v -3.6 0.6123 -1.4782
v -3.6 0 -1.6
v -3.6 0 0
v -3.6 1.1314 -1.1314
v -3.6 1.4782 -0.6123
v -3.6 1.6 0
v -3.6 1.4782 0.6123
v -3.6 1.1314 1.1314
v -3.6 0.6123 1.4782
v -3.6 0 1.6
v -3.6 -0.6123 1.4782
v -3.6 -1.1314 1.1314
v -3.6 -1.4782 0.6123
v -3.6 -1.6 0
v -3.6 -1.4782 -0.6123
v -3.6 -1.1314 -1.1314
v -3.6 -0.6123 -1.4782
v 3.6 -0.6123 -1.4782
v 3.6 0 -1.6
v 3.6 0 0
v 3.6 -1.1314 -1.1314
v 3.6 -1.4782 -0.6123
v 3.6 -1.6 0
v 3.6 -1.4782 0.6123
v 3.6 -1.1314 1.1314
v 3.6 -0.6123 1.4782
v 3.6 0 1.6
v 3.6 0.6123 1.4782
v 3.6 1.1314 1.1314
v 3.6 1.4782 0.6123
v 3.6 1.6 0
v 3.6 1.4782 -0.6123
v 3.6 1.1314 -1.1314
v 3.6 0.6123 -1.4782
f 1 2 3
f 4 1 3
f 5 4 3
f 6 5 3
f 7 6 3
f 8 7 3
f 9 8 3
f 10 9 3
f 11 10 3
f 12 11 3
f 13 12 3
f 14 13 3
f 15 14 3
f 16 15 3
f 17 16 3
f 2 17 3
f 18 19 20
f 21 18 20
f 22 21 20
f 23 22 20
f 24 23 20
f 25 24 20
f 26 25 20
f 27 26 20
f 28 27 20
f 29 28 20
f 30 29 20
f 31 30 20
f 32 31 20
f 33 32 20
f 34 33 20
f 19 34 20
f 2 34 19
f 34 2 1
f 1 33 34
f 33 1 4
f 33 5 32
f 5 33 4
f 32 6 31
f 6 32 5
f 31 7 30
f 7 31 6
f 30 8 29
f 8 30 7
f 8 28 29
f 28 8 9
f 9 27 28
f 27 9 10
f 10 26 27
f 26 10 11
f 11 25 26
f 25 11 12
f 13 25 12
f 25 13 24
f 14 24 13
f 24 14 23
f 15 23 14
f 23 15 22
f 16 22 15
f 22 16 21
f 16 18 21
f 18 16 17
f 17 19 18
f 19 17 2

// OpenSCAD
// file: ../p/4-4cyli.scad
use <../lib.scad>
function ldraw_lib__4_4cyli() = [
// 0 Cylinder 1.0
// 0 Name: 4-4cyli.dat
// 0 Author: James Jessiman
// 0 !LDRAW_ORG Primitive UPDATE 2005-01
// 0 !LICENSE Licensed under CC BY 4.0 : see CAreadme.txt
// 
// 0 BFC CERTIFY CCW
  [0,"BFC","CERTIFY"],
  [0,"BFC","CCW"],
// 
// 0 !HISTORY 1998-12-15 [PTadmin] Official Update 1998-10
// 0 !HISTORY 2002-03-23 [sbliss] Added BFC statement; merged headers from files in distributions LDraw 0.27 and Complete.
// 0 !HISTORY 2002-04-25 [PTadmin] Official Update 2002-02
// 0 !HISTORY 2004-12-14 [guyvivan] BFC CCW
// 0 !HISTORY 2005-12-28 [PTadmin] Official Update 2005-01
// 0 !HISTORY 2007-06-24 [PTadmin] Header formatted for Contributor Agreement
// 0 !HISTORY 2008-07-01 [PTadmin] Official Update 2008-01
// 
// 
// 4 16 1 1 0 0.9239 1 0.3827 0.9239 0 0.3827 1 0 0
  [4,16,1,1,0,0.9239,1,0.3827,0.9239,0,0.3827,1,0,0],
// 5 24 1 0 0 1 1 0 0.9239 0 0.3827 0.9239 0 -0.3827
  [5,24,1,0,0,1,1,0,0.9239,0,0.3827,0.9239,0,-0.3827],
// 4 16 0.9239 1 0.3827 0.7071 1 0.7071 0.7071 0 0.7071 0.9239 0 0.3827
  [4,16,0.9239,1,0.3827,0.7071,1,0.7071,0.7071,0,0.7071,0.9239,0,0.3827],
// 5 24 0.9239 0 0.3827 0.9239 1 0.3827 0.7071 0 0.7071 1 0 0
  [5,24,0.9239,0,0.3827,0.9239,1,0.3827,0.7071,0,0.7071,1,0,0],
// 4 16 0.7071 1 0.7071 0.3827 1 0.9239 0.3827 0 0.9239 0.7071 0 0.7071
  [4,16,0.7071,1,0.7071,0.3827,1,0.9239,0.3827,0,0.9239,0.7071,0,0.7071],
// 5 24 0.7071 0 0.7071 0.7071 1 0.7071 0.3827 0 0.9239 0.9239 0 0.3827
  [5,24,0.7071,0,0.7071,0.7071,1,0.7071,0.3827,0,0.9239,0.9239,0,0.3827],
// 4 16 0.3827 1 0.9239 0 1 1 0 0 1 0.3827 0 0.9239
  [4,16,0.3827,1,0.9239,0,1,1,0,0,1,0.3827,0,0.9239],
// 5 24 0.3827 0 0.9239 0.3827 1 0.9239 0 0 1 0.7071 0 0.7071
  [5,24,0.3827,0,0.9239,0.3827,1,0.9239,0,0,1,0.7071,0,0.7071],
// 4 16 0 1 1 -0.3827 1 0.9239 -0.3827 0 0.9239 0 0 1
  [4,16,0,1,1,-0.3827,1,0.9239,-0.3827,0,0.9239,0,0,1],
// 5 24 0 0 1 0 1 1 -0.3827 0 0.9239 0.3827 0 0.9239
  [5,24,0,0,1,0,1,1,-0.3827,0,0.9239,0.3827,0,0.9239],
// 4 16 -0.3827 1 0.9239 -0.7071 1 0.7071 -0.7071 0 0.7071 -0.3827 0 0.9239
  [4,16,-0.3827,1,0.9239,-0.7071,1,0.7071,-0.7071,0,0.7071,-0.3827,0,0.9239],
// 5 24 -0.3827 0 0.9239 -0.3827 1 0.9239 -0.7071 0 0.7071 0 0 1
  [5,24,-0.3827,0,0.9239,-0.3827,1,0.9239,-0.7071,0,0.7071,0,0,1],
// 4 16 -0.7071 1 0.7071 -0.9239 1 0.3827 -0.9239 0 0.3827 -0.7071 0 0.7071
  [4,16,-0.7071,1,0.7071,-0.9239,1,0.3827,-0.9239,0,0.3827,-0.7071,0,0.7071],
// 5 24 -0.7071 0 0.7071 -0.7071 1 0.7071 -0.9239 0 0.3827 -0.3827 0 0.9239
  [5,24,-0.7071,0,0.7071,-0.7071,1,0.7071,-0.9239,0,0.3827,-0.3827,0,0.9239],
// 4 16 -0.9239 1 0.3827 -1 1 0 -1 0 0 -0.9239 0 0.3827
  [4,16,-0.9239,1,0.3827,-1,1,0,-1,0,0,-0.9239,0,0.3827],
// 5 24 -0.9239 0 0.3827 -0.9239 1 0.3827 -1 0 0 -0.7071 0 0.7071
  [5,24,-0.9239,0,0.3827,-0.9239,1,0.3827,-1,0,0,-0.7071,0,0.7071],
// 4 16 -1 1 0 -0.9239 1 -0.3827 -0.9239 0 -0.3827 -1 0 0
  [4,16,-1,1,0,-0.9239,1,-0.3827,-0.9239,0,-0.3827,-1,0,0],
// 5 24 -1 0 0 -1 1 0 -0.9239 0 -0.3827 -0.9239 0 0.3827
  [5,24,-1,0,0,-1,1,0,-0.9239,0,-0.3827,-0.9239,0,0.3827],
// 4 16 -0.9239 1 -0.3827 -0.7071 1 -0.7071 -0.7071 0 -0.7071 -0.9239 0 -0.3827
  [4,16,-0.9239,1,-0.3827,-0.7071,1,-0.7071,-0.7071,0,-0.7071,-0.9239,0,-0.3827],
// 5 24 -0.9239 0 -0.3827 -0.9239 1 -0.3827 -0.7071 0 -0.7071 -1 0 0
  [5,24,-0.9239,0,-0.3827,-0.9239,1,-0.3827,-0.7071,0,-0.7071,-1,0,0],
// 4 16 -0.7071 1 -0.7071 -0.3827 1 -0.9239 -0.3827 0 -0.9239 -0.7071 0 -0.7071
  [4,16,-0.7071,1,-0.7071,-0.3827,1,-0.9239,-0.3827,0,-0.9239,-0.7071,0,-0.7071],
// 5 24 -0.7071 0 -0.7071 -0.7071 1 -0.7071 -0.3827 0 -0.9239 -0.9239 0 -0.3827
  [5,24,-0.7071,0,-0.7071,-0.7071,1,-0.7071,-0.3827,0,-0.9239,-0.9239,0,-0.3827],
// 4 16 -0.3827 1 -0.9239 0 1 -1 0 0 -1 -0.3827 0 -0.9239
  [4,16,-0.3827,1,-0.9239,0,1,-1,0,0,-1,-0.3827,0,-0.9239],
// 5 24 -0.3827 0 -0.9239 -0.3827 1 -0.9239 0 0 -1 -0.7071 0 -0.7071
  [5,24,-0.3827,0,-0.9239,-0.3827,1,-0.9239,0,0,-1,-0.7071,0,-0.7071],
// 4 16 0 1 -1 0.3827 1 -0.9239 0.3827 0 -0.9239 0 0 -1
  [4,16,0,1,-1,0.3827,1,-0.9239,0.3827,0,-0.9239,0,0,-1],
// 5 24 0 0 -1 0 1 -1 0.3827 0 -0.9239 -0.3827 0 -0.9239
  [5,24,0,0,-1,0,1,-1,0.3827,0,-0.9239,-0.3827,0,-0.9239],
// 4 16 0.3827 1 -0.9239 0.7071 1 -0.7071 0.7071 0 -0.7071 0.3827 0 -0.9239
  [4,16,0.3827,1,-0.9239,0.7071,1,-0.7071,0.7071,0,-0.7071,0.3827,0,-0.9239],
// 5 24 0.3827 0 -0.9239 0.3827 1 -0.9239 0.7071 0 -0.7071 0 0 -1
  [5,24,0.3827,0,-0.9239,0.3827,1,-0.9239,0.7071,0,-0.7071,0,0,-1],
// 4 16 0.7071 1 -0.7071 0.9239 1 -0.3827 0.9239 0 -0.3827 0.7071 0 -0.7071
  [4,16,0.7071,1,-0.7071,0.9239,1,-0.3827,0.9239,0,-0.3827,0.7071,0,-0.7071],
// 5 24 0.7071 0 -0.7071 0.7071 1 -0.7071 0.9239 0 -0.3827 0.3827 0 -0.9239
  [5,24,0.7071,0,-0.7071,0.7071,1,-0.7071,0.9239,0,-0.3827,0.3827,0,-0.9239],
// 4 16 0.9239 1 -0.3827 1 1 0 1 0 0 0.9239 0 -0.3827
  [4,16,0.9239,1,-0.3827,1,1,0,1,0,0,0.9239,0,-0.3827],
// 5 24 0.9239 0 -0.3827 0.9239 1 -0.3827 1 0 0 0.7071 0 -0.7071
  [5,24,0.9239,0,-0.3827,0.9239,1,-0.3827,1,0,0,0.7071,0,-0.7071],
// 0
];
module ldraw_lib__4_4cyli(step=0, col=false, unit=2/5, alt=false, line=0.2, solid=!$preview)
    makepoly(ldraw_lib__4_4cyli(), step=step, col=col, unit=unit, alt=alt, line=line, solid=solid);
ldraw_lib__4_4cyli(line=0.2);
// file: ../p/4-4edge.scad
use <../lib.scad>
function ldraw_lib__4_4edge() = [
// 0 Circle 1.0
// 0 Name: 4-4edge.dat
// 0 Author: James Jessiman
// 0 !LDRAW_ORG Primitive UPDATE 2017-01
// 0 !LICENSE Licensed under CC BY 4.0 : see CAreadme.txt
// 
// 0 BFC CERTIFY CCW
  [0,"BFC","CERTIFY"],
  [0,"BFC","CCW"],
// 
// 0 !HISTORY 1998-12-15 [PTadmin] Official Update 1998-10
// 0 !HISTORY 2005-12-28 [PTadmin] Official Update 2005-01
// 0 !HISTORY 2007-06-24 [PTadmin] Header formatted for Contributor Agreement
// 0 !HISTORY 2008-07-01 [PTadmin] Official Update 2008-01
// 0 !HISTORY 2017-01-15 [Steffen] BFCed
// 0 !HISTORY 2017-12-30 [PTadmin] Official Update 2017-01
// 
// 
// 2 24 1 0 0 0.9239 0 0.3827
  [2,24,1,0,0,0.9239,0,0.3827],
// 2 24 0.9239 0 0.3827 0.7071 0 0.7071
  [2,24,0.9239,0,0.3827,0.7071,0,0.7071],
// 2 24 0.7071 0 0.7071 0.3827 0 0.9239
  [2,24,0.7071,0,0.7071,0.3827,0,0.9239],
// 2 24 0.3827 0 0.9239 0 0 1
  [2,24,0.3827,0,0.9239,0,0,1],
// 2 24 0 0 1 -0.3827 0 0.9239
  [2,24,0,0,1,-0.3827,0,0.9239],
// 2 24 -0.3827 0 0.9239 -0.7071 0 0.7071
  [2,24,-0.3827,0,0.9239,-0.7071,0,0.7071],
// 2 24 -0.7071 0 0.7071 -0.9239 0 0.3827
  [2,24,-0.7071,0,0.7071,-0.9239,0,0.3827],
// 2 24 -0.9239 0 0.3827 -1 0 -0
  [2,24,-0.9239,0,0.3827,-1,0,-0],
// 2 24 -1 0 -0 -0.9239 0 -0.3827
  [2,24,-1,0,-0,-0.9239,0,-0.3827],
// 2 24 -0.9239 0 -0.3827 -0.7071 0 -0.7071
  [2,24,-0.9239,0,-0.3827,-0.7071,0,-0.7071],
// 2 24 -0.7071 0 -0.7071 -0.3827 0 -0.9239
  [2,24,-0.7071,0,-0.7071,-0.3827,0,-0.9239],
// 2 24 -0.3827 0 -0.9239 0 0 -1
  [2,24,-0.3827,0,-0.9239,0,0,-1],
// 2 24 0 0 -1 0.3827 0 -0.9239
  [2,24,0,0,-1,0.3827,0,-0.9239],
// 2 24 0.3827 0 -0.9239 0.7071 0 -0.7071
  [2,24,0.3827,0,-0.9239,0.7071,0,-0.7071],
// 2 24 0.7071 0 -0.7071 0.9239 0 -0.3827
  [2,24,0.7071,0,-0.7071,0.9239,0,-0.3827],
// 2 24 0.9239 0 -0.3827 1 0 0
  [2,24,0.9239,0,-0.3827,1,0,0],
];
module ldraw_lib__4_4edge(step=0, col=false, unit=2/5, alt=false, line=0.2, solid=!$preview)
    makepoly(ldraw_lib__4_4edge(), step=step, col=col, unit=unit, alt=alt, line=line, solid=solid);
ldraw_lib__4_4edge(line=0.2);
// file: ../p/4-4disc.scad
use <../lib.scad>
function ldraw_lib__4_4disc() = [
// 0 Disc 1.0
// 0 Name: 4-4disc.dat
// 0 Author: James Jessiman
// 0 !LDRAW_ORG Primitive UPDATE 2002-02
// 0 !LICENSE Licensed under CC BY 4.0 : see CAreadme.txt
// 
// 0 BFC CERTIFY CCW
  [0,"BFC","CERTIFY"],
  [0,"BFC","CCW"],
// 
// 0 !HISTORY 1998-12-15 [PTadmin] Official Update 1998-10
// 0 !HISTORY 2002-03-23 [sbliss] Added BFC statement
// 0 !HISTORY 2002-04-25 [PTadmin] Official Update 2002-02
// 0 !HISTORY 2007-06-24 [PTadmin] Header formatted for Contributor Agreement
// 0 !HISTORY 2008-07-01 [PTadmin] Official Update 2008-01
// 
// 
// 3 16 0 0 0 1 0 0 0.9239 0 0.3827
  [3,16,0,0,0,1,0,0,0.9239,0,0.3827],
// 3 16 0 0 0 0.9239 0 0.3827 0.7071 0 0.7071
  [3,16,0,0,0,0.9239,0,0.3827,0.7071,0,0.7071],
// 3 16 0 0 0 0.7071 0 0.7071 0.3827 0 0.9239
  [3,16,0,0,0,0.7071,0,0.7071,0.3827,0,0.9239],
// 3 16 0 0 0 0.3827 0 0.9239 0 0 1
  [3,16,0,0,0,0.3827,0,0.9239,0,0,1],
// 3 16 0 0 0 0 0 1 -0.3827 0 0.9239
  [3,16,0,0,0,0,0,1,-0.3827,0,0.9239],
// 3 16 0 0 0 -0.3827 0 0.9239 -0.7071 0 0.7071
  [3,16,0,0,0,-0.3827,0,0.9239,-0.7071,0,0.7071],
// 3 16 0 0 0 -0.7071 0 0.7071 -0.9239 0 0.3827
  [3,16,0,0,0,-0.7071,0,0.7071,-0.9239,0,0.3827],
// 3 16 0 0 0 -0.9239 0 0.3827 -1 0 -0
  [3,16,0,0,0,-0.9239,0,0.3827,-1,0,-0],
// 3 16 0 0 0 -1 0 -0 -0.9239 0 -0.3827
  [3,16,0,0,0,-1,0,-0,-0.9239,0,-0.3827],
// 3 16 0 0 0 -0.9239 0 -0.3827 -0.7071 0 -0.7071
  [3,16,0,0,0,-0.9239,0,-0.3827,-0.7071,0,-0.7071],
// 3 16 0 0 0 -0.7071 0 -0.7071 -0.3827 0 -0.9239
  [3,16,0,0,0,-0.7071,0,-0.7071,-0.3827,0,-0.9239],
// 3 16 0 0 0 -0.3827 0 -0.9239 0 0 -1
  [3,16,0,0,0,-0.3827,0,-0.9239,0,0,-1],
// 3 16 0 0 0 0 0 -1 0.3827 0 -0.9239
  [3,16,0,0,0,0,0,-1,0.3827,0,-0.9239],
// 3 16 0 0 0 0.3827 0 -0.9239 0.7071 0 -0.7071
  [3,16,0,0,0,0.3827,0,-0.9239,0.7071,0,-0.7071],
// 3 16 0 0 0 0.7071 0 -0.7071 0.9239 0 -0.3827
  [3,16,0,0,0,0.7071,0,-0.7071,0.9239,0,-0.3827],
// 3 16 0 0 0 0.9239 0 -0.3827 1 0 0
  [3,16,0,0,0,0.9239,0,-0.3827,1,0,0],
// 0
];
module ldraw_lib__4_4disc(step=0, col=false, unit=2/5, alt=false, line=0.2, solid=!$preview)
    makepoly(ldraw_lib__4_4disc(), step=step, col=col, unit=unit, alt=alt, line=line, solid=solid);
ldraw_lib__4_4disc(line=0.2);
// file: ../p/4-4cylo.scad
use <../lib.scad>
use <4-4cyli.scad>
use <4-4edge.scad>
function ldraw_lib__4_4cylo() = [
// 0 Cylinder Open 1.0
// 0 Name: 4-4cylo.dat
// 0 Author: Mark Kennedy [mkennedy]
// 0 !LDRAW_ORG Primitive UPDATE 2010-01
// 0 !LICENSE Licensed under CC BY 4.0 : see CAreadme.txt
// 
// 0 BFC CERTIFY CCW
  [0,"BFC","CERTIFY"],
  [0,"BFC","CCW"],
// 
// 0 !HISTORY 2010-04-05 [PTadmin] Official Update 2010-01
// 
// 
// 1 16 0 0 0 1 0 0 0 1 0 0 0 1 4-4edge.dat
  [1,16,0,0,0,1,0,0,0,1,0,0,0,1, ldraw_lib__4_4edge()],
// 1 16 0 1 0 1 0 0 0 1 0 0 0 1 4-4edge.dat
  [1,16,0,1,0,1,0,0,0,1,0,0,0,1, ldraw_lib__4_4edge()],
// 1 16 0 0 0 1 0 0 0 1 0 0 0 1 4-4cyli.dat
  [1,16,0,0,0,1,0,0,0,1,0,0,0,1, ldraw_lib__4_4cyli()],
// 0
];
module ldraw_lib__4_4cylo(step=0, col=false, unit=2/5, alt=false, line=0.2, solid=!$preview)
    makepoly(ldraw_lib__4_4cylo(), step=step, col=col, unit=unit, alt=alt, line=line, solid=solid);
ldraw_lib__4_4cylo(line=0.2);
// main file
use <../lib.scad>
use <../p/4-4cylo.scad>
use <../p/4-4disc.scad>
use <../p/4-4edge.scad>
function ldraw_lib__76065k01() = [
// 0 ~String Minifig Grip
// 0 Name: 76065k01.dat
// 0 Author: Magnus Forsberg [MagFors]
// 0 !LDRAW_ORG Part Flexible_Section UPDATE 2024-11
// 0 !LICENSE Licensed under CC BY 4.0 : see CAreadme.txt
// 
// 0 BFC CERTIFY CCW
  [0,"BFC","CERTIFY"],
  [0,"BFC","CCW"],
// 
// 0 !CATEGORY Minifig Accessory
// 
// 0 !HISTORY 2023-03-29 [MagFors] Original by Steve Bliss as 572c, reworked
// 0 !HISTORY 2024-12-30 [OrionP] Official Update 2024-11
// 
// 1 16 -9 0 0 0 1 0 1.5 0 0 0 0 1.5 4-4edge.dat
  [1,16,-9,0,0,0,1,0,1.5,0,0,0,0,1.5, ldraw_lib__4_4edge()],
// 1 16 9 0 0 0 1 0 1.5 0 0 0 0 1.5 4-4edge.dat
  [1,16,9,0,0,0,1,0,1.5,0,0,0,0,1.5, ldraw_lib__4_4edge()],
// 1 16 -9 0 0 0 1 0 4 0 0 0 0 4 4-4disc.dat
  [1,16,-9,0,0,0,1,0,4,0,0,0,0,4, ldraw_lib__4_4disc()],
// 1 16 9 0 0 0 -1 0 4 0 0 0 0 -4 4-4disc.dat
  [1,16,9,0,0,0,-1,0,4,0,0,0,0,-4, ldraw_lib__4_4disc()],
// 1 16 -9 0 0 0 18 0 4 0 0 0 0 4 4-4cylo.dat
  [1,16,-9,0,0,0,18,0,4,0,0,0,0,4, ldraw_lib__4_4cylo()],
];
module ldraw_lib__76065k01(step=0, col=false, unit=2/5, alt=false, line=0.2, solid=!$preview)
    makepoly(ldraw_lib__76065k01(), step=step, col=col, unit=unit, alt=alt, line=line, solid=solid);
ldraw_lib__76065k01(line=0.2);
